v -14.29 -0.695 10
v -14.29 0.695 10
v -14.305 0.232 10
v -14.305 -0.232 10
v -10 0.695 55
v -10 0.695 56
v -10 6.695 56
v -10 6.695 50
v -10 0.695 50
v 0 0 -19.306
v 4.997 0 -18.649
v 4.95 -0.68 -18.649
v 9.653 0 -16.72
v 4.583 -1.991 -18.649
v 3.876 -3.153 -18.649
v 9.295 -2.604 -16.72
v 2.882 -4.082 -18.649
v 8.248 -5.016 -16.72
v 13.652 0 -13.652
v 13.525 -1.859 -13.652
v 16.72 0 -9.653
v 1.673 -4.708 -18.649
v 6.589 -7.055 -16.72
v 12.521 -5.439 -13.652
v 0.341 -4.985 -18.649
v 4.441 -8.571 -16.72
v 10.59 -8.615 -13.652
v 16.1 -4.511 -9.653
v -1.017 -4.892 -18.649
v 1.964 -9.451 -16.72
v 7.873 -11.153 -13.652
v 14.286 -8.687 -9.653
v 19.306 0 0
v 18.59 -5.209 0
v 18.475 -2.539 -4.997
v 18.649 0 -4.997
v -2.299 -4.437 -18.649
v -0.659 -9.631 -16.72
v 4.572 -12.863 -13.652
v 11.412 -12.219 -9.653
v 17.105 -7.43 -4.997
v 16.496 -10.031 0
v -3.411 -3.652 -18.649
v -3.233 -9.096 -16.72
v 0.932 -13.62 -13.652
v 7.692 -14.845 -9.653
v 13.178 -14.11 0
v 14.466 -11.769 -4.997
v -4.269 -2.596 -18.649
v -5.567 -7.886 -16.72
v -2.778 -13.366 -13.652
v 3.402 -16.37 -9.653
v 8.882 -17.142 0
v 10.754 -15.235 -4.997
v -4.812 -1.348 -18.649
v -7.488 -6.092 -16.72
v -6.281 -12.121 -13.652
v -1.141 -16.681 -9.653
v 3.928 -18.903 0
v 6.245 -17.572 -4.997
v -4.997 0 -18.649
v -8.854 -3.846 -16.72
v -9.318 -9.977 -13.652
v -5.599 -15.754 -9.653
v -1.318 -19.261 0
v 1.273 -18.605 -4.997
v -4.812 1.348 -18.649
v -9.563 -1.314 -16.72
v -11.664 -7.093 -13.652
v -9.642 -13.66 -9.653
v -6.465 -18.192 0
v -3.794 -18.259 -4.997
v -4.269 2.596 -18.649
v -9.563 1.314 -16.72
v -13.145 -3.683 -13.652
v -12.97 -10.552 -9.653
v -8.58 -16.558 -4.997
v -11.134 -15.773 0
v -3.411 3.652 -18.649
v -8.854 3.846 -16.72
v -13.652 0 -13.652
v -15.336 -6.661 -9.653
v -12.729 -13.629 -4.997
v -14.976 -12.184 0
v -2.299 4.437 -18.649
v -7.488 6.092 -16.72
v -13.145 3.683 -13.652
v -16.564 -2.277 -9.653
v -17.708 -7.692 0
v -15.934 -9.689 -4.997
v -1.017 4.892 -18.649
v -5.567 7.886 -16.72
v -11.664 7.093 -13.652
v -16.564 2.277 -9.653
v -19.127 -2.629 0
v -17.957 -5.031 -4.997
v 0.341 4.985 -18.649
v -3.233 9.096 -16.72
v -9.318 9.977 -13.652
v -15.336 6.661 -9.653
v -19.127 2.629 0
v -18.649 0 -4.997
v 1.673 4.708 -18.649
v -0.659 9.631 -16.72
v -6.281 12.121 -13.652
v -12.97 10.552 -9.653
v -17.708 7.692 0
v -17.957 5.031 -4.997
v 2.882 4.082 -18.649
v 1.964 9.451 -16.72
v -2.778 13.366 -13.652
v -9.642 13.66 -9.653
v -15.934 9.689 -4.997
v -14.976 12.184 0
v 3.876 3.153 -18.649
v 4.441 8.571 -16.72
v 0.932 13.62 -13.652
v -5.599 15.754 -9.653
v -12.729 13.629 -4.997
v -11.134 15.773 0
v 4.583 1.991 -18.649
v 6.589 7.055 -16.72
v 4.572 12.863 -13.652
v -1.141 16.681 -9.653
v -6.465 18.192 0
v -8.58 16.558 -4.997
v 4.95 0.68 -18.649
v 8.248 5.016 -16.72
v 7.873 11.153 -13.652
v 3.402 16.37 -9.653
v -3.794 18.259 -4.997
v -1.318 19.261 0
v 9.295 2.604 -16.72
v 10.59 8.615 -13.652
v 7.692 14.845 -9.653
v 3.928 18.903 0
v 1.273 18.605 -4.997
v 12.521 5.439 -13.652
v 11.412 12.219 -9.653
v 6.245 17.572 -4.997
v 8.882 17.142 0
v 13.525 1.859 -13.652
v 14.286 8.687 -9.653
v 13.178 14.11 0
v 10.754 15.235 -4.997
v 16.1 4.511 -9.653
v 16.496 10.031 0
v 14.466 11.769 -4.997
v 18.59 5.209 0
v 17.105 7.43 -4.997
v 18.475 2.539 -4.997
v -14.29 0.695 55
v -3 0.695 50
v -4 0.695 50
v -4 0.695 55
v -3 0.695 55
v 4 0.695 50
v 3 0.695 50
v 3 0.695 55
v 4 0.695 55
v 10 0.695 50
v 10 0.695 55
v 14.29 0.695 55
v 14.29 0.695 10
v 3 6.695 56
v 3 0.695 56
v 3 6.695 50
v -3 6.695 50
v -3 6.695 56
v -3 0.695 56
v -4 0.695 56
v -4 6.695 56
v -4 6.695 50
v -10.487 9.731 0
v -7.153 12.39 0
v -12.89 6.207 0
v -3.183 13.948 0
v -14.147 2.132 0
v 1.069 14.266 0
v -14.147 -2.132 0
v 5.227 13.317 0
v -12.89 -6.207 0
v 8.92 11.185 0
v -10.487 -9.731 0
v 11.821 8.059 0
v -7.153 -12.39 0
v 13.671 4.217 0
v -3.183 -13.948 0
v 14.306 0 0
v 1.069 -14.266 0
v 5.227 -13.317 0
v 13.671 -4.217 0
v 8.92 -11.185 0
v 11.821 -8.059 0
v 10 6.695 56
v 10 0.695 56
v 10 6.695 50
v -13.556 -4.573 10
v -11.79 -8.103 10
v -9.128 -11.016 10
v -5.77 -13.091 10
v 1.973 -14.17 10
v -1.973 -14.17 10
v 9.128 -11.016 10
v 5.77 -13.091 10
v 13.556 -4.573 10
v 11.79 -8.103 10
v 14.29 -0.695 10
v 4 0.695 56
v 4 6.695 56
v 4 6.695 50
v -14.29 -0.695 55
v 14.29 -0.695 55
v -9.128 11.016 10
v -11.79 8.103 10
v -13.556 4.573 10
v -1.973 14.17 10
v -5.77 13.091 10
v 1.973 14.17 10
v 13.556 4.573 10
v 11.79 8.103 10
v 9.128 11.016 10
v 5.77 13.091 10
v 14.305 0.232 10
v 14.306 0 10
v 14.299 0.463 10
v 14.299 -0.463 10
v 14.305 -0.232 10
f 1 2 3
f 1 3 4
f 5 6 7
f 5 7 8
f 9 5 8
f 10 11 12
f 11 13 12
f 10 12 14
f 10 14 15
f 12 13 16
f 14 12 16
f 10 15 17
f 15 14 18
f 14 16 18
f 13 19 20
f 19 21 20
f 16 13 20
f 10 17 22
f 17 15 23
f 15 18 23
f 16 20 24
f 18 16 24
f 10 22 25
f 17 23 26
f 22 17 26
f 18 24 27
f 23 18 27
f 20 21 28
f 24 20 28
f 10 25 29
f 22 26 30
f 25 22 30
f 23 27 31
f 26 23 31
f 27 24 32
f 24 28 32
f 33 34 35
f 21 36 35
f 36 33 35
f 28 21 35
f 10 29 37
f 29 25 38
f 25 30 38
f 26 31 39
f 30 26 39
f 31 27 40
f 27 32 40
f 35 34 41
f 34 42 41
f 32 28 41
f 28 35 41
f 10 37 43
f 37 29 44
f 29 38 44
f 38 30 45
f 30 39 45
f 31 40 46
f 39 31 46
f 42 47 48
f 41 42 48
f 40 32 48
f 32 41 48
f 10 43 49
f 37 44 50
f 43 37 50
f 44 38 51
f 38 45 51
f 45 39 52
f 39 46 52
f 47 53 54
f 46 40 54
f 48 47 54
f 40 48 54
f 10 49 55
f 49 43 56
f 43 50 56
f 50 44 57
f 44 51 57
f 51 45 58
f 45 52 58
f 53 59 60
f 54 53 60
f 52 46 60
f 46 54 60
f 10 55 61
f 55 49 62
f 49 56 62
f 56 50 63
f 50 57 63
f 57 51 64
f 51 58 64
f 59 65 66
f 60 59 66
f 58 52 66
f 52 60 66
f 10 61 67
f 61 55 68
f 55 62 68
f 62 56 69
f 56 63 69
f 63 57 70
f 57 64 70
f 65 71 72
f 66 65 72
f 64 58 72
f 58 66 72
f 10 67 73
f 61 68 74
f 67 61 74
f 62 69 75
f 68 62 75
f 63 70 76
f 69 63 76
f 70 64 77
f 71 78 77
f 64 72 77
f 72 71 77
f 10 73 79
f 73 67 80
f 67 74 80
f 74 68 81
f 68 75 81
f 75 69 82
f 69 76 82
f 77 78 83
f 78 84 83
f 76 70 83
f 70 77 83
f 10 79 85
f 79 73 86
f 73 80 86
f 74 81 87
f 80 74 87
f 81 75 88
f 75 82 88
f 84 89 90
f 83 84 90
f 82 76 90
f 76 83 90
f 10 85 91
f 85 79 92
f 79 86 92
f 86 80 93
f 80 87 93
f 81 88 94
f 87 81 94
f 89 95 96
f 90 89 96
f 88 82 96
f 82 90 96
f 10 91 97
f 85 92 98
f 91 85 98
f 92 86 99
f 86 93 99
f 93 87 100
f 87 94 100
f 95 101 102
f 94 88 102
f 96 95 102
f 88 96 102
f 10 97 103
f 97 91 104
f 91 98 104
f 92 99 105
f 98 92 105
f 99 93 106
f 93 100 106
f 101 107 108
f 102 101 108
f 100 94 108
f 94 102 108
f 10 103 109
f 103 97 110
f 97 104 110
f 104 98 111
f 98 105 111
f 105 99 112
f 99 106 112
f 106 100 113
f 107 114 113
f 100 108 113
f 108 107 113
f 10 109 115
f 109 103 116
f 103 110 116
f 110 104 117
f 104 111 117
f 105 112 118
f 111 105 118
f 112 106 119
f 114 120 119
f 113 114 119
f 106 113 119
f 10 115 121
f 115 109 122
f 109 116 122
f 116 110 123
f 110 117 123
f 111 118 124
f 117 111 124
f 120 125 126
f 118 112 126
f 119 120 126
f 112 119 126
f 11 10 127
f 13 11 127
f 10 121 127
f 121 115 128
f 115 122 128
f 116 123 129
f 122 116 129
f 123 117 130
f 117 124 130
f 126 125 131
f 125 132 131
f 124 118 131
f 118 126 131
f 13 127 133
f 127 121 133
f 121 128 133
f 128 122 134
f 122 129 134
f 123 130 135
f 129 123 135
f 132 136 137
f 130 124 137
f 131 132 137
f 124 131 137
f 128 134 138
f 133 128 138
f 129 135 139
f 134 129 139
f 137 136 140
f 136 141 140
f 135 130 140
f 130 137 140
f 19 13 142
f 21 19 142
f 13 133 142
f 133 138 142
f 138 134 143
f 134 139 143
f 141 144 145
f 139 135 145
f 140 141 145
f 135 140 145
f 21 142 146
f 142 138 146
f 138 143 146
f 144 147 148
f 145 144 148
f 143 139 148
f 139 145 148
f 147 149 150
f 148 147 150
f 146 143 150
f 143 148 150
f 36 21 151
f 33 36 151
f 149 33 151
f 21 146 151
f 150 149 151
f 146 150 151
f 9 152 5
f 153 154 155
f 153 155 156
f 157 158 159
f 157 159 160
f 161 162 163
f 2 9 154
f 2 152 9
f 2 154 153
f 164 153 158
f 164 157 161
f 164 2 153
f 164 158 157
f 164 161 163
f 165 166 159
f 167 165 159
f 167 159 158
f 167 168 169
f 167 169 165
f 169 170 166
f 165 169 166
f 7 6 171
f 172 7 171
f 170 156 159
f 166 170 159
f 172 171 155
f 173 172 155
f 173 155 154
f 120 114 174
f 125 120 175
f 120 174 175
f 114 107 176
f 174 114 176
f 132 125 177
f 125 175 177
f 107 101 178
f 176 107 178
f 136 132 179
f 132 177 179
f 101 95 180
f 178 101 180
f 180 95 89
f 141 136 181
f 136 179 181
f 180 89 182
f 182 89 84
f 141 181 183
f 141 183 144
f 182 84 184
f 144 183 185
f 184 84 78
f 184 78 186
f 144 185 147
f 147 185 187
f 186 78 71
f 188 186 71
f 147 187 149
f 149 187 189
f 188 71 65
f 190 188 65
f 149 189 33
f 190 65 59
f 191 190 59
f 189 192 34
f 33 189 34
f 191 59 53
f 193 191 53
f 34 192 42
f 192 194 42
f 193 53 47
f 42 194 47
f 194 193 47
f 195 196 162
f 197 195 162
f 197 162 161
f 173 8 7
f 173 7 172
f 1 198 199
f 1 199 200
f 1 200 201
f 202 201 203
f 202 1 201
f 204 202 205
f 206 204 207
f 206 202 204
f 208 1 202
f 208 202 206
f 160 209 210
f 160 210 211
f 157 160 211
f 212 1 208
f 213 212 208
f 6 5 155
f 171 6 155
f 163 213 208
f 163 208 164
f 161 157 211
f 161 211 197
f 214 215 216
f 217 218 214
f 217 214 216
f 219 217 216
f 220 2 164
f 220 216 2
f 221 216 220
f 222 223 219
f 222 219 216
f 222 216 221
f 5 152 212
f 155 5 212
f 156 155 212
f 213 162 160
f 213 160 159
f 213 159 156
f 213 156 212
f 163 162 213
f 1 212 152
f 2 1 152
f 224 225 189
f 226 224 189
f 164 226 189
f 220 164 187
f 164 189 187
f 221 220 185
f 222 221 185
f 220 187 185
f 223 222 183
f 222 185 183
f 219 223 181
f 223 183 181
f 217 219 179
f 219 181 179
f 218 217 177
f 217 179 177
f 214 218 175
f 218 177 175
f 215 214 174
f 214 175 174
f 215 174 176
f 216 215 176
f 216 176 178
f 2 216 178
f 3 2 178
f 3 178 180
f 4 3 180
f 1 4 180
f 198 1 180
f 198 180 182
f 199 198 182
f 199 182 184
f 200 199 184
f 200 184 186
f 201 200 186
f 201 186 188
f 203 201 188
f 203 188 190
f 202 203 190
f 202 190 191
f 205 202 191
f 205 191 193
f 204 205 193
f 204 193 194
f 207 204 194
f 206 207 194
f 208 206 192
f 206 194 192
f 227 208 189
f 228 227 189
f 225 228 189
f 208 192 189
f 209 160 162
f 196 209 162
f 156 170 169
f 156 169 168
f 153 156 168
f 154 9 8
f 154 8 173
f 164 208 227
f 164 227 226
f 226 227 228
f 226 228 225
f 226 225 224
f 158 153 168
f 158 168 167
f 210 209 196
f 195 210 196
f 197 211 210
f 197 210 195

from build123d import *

# Parameters (mm, degrees)
SKETCH2_R           = 14.306408623
BOSS_EXTRUDE1_DEPTH = 10
SKETCH3_W           = 28.579032966
SKETCH3_H           = 1.390030786
BOSS_EXTRUDE2_DEPTH = 45
SKETCH4_W           = 6
SKETCH4_H           = 6
BOSS_EXTRUDE3_DEPTH = 6


with BuildPart() as part:
    # Sketch1 → Revolve1 (revolve)
    with BuildSketch(Plane(origin=(0, 0, 0), x_dir=(1, 0, 0), z_dir=(0, 1, 0))):
        with BuildLine():
            Line((19.306408623, 0), (0, 0))
            Line((0, 0), (0, 19.306408623))
            ThreePointArc((0, 19.306408623), (13.651692458, 13.651692458), (19.306408623, 0))
        make_face()
    revolve(axis=Axis((0, 0, 0), (0, 0, -1)))

    # Sketch2 → Boss-Extrude1 (add)
    with BuildSketch(Plane.XY):
        Circle(SKETCH2_R)
    extrude(amount=BOSS_EXTRUDE1_DEPTH)

    # Sketch3 → Boss-Extrude2 (add)
    with BuildSketch(Plane.XY.offset(10)):
        Rectangle(SKETCH3_W, SKETCH3_H)
    extrude(amount=BOSS_EXTRUDE2_DEPTH)

    # Sketch4 → Boss-Extrude3 (add)
    with BuildSketch(Plane(origin=(0, 0.695015393, 0), x_dir=(1, 0, 0), z_dir=(0, 1, 0))):
        with Locations((7, -53)):
            Rectangle(SKETCH4_W, SKETCH4_H)
        with Locations((0, -53)):
            Rectangle(SKETCH4_W, SKETCH4_H)
        with Locations((-7, -53)):
            Rectangle(SKETCH4_W, SKETCH4_H)
    extrude(amount=BOSS_EXTRUDE3_DEPTH)


solid = part.part
